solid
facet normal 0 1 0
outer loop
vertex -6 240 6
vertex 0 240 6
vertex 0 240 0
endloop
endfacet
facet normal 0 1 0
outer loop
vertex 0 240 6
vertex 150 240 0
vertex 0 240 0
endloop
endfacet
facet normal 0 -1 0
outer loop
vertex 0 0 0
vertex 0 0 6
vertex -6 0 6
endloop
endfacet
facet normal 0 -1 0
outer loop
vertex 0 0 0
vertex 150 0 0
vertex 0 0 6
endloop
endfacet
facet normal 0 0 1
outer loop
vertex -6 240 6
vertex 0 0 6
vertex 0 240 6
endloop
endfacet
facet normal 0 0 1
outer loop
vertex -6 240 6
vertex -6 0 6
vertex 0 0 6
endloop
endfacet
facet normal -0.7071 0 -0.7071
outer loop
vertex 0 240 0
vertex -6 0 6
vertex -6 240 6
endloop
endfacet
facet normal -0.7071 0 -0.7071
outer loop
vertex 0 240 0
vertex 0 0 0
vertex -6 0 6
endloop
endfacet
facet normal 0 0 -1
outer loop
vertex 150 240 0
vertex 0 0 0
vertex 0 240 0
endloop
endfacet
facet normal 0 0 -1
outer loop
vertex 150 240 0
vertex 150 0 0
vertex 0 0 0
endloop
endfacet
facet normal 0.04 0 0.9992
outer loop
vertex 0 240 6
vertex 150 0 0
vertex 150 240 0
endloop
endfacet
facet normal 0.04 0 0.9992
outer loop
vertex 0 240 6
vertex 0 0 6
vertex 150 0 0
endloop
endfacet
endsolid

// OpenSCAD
// bodenplatte.scad
// Side profile: two right triangles sharing a vertical 6 mm edge.
// Red triangle:  top edge 6 mm, vertical edge 6 mm, 90deg between them, hypotenuse y.
// Green triangle: bottom edge 150 mm, vertical edge 6 mm, hypotenuse x (long taper to the tip).
// All units in millimeters.

// ---------- Parameters ----------
base_length = 150;  // bottom edge of the green triangle (V -> tip)
height      = 6;    // shared vertical edge between the two triangles
top_length  = 6;    // horizontal top edge of the red triangle (A -> P)
depth       = 240;  // extrusion depth of the part

draft_mode  = true;             // fast render while developing
$fn         = draft_mode ? 30 : 60;

// ---------- Computed (the missing values from the sketch) ----------
x = sqrt(base_length * base_length + height * height); // long taper edge
y = sqrt(top_length * top_length + height * height);   // red hypotenuse

echo(str("x (long taper edge) = ", x, " mm"));
echo(str("y (red hypotenuse)  = ", y, " mm"));

// ---------- Profile (side view, origin at V = bottom of the shared edge) ----------
//  A(-top_length, height) ---- P(0, height)
//        \                      |\____
//       y \                     |6    ‾‾‾‾----____ x
//          \                    |                 ‾‾‾‾----____
//           ‾‾‾‾--- V(0, 0) ----+------------ base_length ----- T(tip)
profile_points = [
    [-top_length, height],   // A: top-left
    [0,           height],   // P: top of shared edge
    [base_length, 0],        // T: tip
    [0,           0]         // V: bottom of shared edge
];

// ---------- Part ----------
module bodenplatte() {
    // profile drawn in XZ (side view), extruded along Y, bottom edge on the build plate
    translate([0, depth, 0])
        rotate([90, 0, 0])
            linear_extrude(height = depth)
                polygon(profile_points);
}

bodenplatte();
